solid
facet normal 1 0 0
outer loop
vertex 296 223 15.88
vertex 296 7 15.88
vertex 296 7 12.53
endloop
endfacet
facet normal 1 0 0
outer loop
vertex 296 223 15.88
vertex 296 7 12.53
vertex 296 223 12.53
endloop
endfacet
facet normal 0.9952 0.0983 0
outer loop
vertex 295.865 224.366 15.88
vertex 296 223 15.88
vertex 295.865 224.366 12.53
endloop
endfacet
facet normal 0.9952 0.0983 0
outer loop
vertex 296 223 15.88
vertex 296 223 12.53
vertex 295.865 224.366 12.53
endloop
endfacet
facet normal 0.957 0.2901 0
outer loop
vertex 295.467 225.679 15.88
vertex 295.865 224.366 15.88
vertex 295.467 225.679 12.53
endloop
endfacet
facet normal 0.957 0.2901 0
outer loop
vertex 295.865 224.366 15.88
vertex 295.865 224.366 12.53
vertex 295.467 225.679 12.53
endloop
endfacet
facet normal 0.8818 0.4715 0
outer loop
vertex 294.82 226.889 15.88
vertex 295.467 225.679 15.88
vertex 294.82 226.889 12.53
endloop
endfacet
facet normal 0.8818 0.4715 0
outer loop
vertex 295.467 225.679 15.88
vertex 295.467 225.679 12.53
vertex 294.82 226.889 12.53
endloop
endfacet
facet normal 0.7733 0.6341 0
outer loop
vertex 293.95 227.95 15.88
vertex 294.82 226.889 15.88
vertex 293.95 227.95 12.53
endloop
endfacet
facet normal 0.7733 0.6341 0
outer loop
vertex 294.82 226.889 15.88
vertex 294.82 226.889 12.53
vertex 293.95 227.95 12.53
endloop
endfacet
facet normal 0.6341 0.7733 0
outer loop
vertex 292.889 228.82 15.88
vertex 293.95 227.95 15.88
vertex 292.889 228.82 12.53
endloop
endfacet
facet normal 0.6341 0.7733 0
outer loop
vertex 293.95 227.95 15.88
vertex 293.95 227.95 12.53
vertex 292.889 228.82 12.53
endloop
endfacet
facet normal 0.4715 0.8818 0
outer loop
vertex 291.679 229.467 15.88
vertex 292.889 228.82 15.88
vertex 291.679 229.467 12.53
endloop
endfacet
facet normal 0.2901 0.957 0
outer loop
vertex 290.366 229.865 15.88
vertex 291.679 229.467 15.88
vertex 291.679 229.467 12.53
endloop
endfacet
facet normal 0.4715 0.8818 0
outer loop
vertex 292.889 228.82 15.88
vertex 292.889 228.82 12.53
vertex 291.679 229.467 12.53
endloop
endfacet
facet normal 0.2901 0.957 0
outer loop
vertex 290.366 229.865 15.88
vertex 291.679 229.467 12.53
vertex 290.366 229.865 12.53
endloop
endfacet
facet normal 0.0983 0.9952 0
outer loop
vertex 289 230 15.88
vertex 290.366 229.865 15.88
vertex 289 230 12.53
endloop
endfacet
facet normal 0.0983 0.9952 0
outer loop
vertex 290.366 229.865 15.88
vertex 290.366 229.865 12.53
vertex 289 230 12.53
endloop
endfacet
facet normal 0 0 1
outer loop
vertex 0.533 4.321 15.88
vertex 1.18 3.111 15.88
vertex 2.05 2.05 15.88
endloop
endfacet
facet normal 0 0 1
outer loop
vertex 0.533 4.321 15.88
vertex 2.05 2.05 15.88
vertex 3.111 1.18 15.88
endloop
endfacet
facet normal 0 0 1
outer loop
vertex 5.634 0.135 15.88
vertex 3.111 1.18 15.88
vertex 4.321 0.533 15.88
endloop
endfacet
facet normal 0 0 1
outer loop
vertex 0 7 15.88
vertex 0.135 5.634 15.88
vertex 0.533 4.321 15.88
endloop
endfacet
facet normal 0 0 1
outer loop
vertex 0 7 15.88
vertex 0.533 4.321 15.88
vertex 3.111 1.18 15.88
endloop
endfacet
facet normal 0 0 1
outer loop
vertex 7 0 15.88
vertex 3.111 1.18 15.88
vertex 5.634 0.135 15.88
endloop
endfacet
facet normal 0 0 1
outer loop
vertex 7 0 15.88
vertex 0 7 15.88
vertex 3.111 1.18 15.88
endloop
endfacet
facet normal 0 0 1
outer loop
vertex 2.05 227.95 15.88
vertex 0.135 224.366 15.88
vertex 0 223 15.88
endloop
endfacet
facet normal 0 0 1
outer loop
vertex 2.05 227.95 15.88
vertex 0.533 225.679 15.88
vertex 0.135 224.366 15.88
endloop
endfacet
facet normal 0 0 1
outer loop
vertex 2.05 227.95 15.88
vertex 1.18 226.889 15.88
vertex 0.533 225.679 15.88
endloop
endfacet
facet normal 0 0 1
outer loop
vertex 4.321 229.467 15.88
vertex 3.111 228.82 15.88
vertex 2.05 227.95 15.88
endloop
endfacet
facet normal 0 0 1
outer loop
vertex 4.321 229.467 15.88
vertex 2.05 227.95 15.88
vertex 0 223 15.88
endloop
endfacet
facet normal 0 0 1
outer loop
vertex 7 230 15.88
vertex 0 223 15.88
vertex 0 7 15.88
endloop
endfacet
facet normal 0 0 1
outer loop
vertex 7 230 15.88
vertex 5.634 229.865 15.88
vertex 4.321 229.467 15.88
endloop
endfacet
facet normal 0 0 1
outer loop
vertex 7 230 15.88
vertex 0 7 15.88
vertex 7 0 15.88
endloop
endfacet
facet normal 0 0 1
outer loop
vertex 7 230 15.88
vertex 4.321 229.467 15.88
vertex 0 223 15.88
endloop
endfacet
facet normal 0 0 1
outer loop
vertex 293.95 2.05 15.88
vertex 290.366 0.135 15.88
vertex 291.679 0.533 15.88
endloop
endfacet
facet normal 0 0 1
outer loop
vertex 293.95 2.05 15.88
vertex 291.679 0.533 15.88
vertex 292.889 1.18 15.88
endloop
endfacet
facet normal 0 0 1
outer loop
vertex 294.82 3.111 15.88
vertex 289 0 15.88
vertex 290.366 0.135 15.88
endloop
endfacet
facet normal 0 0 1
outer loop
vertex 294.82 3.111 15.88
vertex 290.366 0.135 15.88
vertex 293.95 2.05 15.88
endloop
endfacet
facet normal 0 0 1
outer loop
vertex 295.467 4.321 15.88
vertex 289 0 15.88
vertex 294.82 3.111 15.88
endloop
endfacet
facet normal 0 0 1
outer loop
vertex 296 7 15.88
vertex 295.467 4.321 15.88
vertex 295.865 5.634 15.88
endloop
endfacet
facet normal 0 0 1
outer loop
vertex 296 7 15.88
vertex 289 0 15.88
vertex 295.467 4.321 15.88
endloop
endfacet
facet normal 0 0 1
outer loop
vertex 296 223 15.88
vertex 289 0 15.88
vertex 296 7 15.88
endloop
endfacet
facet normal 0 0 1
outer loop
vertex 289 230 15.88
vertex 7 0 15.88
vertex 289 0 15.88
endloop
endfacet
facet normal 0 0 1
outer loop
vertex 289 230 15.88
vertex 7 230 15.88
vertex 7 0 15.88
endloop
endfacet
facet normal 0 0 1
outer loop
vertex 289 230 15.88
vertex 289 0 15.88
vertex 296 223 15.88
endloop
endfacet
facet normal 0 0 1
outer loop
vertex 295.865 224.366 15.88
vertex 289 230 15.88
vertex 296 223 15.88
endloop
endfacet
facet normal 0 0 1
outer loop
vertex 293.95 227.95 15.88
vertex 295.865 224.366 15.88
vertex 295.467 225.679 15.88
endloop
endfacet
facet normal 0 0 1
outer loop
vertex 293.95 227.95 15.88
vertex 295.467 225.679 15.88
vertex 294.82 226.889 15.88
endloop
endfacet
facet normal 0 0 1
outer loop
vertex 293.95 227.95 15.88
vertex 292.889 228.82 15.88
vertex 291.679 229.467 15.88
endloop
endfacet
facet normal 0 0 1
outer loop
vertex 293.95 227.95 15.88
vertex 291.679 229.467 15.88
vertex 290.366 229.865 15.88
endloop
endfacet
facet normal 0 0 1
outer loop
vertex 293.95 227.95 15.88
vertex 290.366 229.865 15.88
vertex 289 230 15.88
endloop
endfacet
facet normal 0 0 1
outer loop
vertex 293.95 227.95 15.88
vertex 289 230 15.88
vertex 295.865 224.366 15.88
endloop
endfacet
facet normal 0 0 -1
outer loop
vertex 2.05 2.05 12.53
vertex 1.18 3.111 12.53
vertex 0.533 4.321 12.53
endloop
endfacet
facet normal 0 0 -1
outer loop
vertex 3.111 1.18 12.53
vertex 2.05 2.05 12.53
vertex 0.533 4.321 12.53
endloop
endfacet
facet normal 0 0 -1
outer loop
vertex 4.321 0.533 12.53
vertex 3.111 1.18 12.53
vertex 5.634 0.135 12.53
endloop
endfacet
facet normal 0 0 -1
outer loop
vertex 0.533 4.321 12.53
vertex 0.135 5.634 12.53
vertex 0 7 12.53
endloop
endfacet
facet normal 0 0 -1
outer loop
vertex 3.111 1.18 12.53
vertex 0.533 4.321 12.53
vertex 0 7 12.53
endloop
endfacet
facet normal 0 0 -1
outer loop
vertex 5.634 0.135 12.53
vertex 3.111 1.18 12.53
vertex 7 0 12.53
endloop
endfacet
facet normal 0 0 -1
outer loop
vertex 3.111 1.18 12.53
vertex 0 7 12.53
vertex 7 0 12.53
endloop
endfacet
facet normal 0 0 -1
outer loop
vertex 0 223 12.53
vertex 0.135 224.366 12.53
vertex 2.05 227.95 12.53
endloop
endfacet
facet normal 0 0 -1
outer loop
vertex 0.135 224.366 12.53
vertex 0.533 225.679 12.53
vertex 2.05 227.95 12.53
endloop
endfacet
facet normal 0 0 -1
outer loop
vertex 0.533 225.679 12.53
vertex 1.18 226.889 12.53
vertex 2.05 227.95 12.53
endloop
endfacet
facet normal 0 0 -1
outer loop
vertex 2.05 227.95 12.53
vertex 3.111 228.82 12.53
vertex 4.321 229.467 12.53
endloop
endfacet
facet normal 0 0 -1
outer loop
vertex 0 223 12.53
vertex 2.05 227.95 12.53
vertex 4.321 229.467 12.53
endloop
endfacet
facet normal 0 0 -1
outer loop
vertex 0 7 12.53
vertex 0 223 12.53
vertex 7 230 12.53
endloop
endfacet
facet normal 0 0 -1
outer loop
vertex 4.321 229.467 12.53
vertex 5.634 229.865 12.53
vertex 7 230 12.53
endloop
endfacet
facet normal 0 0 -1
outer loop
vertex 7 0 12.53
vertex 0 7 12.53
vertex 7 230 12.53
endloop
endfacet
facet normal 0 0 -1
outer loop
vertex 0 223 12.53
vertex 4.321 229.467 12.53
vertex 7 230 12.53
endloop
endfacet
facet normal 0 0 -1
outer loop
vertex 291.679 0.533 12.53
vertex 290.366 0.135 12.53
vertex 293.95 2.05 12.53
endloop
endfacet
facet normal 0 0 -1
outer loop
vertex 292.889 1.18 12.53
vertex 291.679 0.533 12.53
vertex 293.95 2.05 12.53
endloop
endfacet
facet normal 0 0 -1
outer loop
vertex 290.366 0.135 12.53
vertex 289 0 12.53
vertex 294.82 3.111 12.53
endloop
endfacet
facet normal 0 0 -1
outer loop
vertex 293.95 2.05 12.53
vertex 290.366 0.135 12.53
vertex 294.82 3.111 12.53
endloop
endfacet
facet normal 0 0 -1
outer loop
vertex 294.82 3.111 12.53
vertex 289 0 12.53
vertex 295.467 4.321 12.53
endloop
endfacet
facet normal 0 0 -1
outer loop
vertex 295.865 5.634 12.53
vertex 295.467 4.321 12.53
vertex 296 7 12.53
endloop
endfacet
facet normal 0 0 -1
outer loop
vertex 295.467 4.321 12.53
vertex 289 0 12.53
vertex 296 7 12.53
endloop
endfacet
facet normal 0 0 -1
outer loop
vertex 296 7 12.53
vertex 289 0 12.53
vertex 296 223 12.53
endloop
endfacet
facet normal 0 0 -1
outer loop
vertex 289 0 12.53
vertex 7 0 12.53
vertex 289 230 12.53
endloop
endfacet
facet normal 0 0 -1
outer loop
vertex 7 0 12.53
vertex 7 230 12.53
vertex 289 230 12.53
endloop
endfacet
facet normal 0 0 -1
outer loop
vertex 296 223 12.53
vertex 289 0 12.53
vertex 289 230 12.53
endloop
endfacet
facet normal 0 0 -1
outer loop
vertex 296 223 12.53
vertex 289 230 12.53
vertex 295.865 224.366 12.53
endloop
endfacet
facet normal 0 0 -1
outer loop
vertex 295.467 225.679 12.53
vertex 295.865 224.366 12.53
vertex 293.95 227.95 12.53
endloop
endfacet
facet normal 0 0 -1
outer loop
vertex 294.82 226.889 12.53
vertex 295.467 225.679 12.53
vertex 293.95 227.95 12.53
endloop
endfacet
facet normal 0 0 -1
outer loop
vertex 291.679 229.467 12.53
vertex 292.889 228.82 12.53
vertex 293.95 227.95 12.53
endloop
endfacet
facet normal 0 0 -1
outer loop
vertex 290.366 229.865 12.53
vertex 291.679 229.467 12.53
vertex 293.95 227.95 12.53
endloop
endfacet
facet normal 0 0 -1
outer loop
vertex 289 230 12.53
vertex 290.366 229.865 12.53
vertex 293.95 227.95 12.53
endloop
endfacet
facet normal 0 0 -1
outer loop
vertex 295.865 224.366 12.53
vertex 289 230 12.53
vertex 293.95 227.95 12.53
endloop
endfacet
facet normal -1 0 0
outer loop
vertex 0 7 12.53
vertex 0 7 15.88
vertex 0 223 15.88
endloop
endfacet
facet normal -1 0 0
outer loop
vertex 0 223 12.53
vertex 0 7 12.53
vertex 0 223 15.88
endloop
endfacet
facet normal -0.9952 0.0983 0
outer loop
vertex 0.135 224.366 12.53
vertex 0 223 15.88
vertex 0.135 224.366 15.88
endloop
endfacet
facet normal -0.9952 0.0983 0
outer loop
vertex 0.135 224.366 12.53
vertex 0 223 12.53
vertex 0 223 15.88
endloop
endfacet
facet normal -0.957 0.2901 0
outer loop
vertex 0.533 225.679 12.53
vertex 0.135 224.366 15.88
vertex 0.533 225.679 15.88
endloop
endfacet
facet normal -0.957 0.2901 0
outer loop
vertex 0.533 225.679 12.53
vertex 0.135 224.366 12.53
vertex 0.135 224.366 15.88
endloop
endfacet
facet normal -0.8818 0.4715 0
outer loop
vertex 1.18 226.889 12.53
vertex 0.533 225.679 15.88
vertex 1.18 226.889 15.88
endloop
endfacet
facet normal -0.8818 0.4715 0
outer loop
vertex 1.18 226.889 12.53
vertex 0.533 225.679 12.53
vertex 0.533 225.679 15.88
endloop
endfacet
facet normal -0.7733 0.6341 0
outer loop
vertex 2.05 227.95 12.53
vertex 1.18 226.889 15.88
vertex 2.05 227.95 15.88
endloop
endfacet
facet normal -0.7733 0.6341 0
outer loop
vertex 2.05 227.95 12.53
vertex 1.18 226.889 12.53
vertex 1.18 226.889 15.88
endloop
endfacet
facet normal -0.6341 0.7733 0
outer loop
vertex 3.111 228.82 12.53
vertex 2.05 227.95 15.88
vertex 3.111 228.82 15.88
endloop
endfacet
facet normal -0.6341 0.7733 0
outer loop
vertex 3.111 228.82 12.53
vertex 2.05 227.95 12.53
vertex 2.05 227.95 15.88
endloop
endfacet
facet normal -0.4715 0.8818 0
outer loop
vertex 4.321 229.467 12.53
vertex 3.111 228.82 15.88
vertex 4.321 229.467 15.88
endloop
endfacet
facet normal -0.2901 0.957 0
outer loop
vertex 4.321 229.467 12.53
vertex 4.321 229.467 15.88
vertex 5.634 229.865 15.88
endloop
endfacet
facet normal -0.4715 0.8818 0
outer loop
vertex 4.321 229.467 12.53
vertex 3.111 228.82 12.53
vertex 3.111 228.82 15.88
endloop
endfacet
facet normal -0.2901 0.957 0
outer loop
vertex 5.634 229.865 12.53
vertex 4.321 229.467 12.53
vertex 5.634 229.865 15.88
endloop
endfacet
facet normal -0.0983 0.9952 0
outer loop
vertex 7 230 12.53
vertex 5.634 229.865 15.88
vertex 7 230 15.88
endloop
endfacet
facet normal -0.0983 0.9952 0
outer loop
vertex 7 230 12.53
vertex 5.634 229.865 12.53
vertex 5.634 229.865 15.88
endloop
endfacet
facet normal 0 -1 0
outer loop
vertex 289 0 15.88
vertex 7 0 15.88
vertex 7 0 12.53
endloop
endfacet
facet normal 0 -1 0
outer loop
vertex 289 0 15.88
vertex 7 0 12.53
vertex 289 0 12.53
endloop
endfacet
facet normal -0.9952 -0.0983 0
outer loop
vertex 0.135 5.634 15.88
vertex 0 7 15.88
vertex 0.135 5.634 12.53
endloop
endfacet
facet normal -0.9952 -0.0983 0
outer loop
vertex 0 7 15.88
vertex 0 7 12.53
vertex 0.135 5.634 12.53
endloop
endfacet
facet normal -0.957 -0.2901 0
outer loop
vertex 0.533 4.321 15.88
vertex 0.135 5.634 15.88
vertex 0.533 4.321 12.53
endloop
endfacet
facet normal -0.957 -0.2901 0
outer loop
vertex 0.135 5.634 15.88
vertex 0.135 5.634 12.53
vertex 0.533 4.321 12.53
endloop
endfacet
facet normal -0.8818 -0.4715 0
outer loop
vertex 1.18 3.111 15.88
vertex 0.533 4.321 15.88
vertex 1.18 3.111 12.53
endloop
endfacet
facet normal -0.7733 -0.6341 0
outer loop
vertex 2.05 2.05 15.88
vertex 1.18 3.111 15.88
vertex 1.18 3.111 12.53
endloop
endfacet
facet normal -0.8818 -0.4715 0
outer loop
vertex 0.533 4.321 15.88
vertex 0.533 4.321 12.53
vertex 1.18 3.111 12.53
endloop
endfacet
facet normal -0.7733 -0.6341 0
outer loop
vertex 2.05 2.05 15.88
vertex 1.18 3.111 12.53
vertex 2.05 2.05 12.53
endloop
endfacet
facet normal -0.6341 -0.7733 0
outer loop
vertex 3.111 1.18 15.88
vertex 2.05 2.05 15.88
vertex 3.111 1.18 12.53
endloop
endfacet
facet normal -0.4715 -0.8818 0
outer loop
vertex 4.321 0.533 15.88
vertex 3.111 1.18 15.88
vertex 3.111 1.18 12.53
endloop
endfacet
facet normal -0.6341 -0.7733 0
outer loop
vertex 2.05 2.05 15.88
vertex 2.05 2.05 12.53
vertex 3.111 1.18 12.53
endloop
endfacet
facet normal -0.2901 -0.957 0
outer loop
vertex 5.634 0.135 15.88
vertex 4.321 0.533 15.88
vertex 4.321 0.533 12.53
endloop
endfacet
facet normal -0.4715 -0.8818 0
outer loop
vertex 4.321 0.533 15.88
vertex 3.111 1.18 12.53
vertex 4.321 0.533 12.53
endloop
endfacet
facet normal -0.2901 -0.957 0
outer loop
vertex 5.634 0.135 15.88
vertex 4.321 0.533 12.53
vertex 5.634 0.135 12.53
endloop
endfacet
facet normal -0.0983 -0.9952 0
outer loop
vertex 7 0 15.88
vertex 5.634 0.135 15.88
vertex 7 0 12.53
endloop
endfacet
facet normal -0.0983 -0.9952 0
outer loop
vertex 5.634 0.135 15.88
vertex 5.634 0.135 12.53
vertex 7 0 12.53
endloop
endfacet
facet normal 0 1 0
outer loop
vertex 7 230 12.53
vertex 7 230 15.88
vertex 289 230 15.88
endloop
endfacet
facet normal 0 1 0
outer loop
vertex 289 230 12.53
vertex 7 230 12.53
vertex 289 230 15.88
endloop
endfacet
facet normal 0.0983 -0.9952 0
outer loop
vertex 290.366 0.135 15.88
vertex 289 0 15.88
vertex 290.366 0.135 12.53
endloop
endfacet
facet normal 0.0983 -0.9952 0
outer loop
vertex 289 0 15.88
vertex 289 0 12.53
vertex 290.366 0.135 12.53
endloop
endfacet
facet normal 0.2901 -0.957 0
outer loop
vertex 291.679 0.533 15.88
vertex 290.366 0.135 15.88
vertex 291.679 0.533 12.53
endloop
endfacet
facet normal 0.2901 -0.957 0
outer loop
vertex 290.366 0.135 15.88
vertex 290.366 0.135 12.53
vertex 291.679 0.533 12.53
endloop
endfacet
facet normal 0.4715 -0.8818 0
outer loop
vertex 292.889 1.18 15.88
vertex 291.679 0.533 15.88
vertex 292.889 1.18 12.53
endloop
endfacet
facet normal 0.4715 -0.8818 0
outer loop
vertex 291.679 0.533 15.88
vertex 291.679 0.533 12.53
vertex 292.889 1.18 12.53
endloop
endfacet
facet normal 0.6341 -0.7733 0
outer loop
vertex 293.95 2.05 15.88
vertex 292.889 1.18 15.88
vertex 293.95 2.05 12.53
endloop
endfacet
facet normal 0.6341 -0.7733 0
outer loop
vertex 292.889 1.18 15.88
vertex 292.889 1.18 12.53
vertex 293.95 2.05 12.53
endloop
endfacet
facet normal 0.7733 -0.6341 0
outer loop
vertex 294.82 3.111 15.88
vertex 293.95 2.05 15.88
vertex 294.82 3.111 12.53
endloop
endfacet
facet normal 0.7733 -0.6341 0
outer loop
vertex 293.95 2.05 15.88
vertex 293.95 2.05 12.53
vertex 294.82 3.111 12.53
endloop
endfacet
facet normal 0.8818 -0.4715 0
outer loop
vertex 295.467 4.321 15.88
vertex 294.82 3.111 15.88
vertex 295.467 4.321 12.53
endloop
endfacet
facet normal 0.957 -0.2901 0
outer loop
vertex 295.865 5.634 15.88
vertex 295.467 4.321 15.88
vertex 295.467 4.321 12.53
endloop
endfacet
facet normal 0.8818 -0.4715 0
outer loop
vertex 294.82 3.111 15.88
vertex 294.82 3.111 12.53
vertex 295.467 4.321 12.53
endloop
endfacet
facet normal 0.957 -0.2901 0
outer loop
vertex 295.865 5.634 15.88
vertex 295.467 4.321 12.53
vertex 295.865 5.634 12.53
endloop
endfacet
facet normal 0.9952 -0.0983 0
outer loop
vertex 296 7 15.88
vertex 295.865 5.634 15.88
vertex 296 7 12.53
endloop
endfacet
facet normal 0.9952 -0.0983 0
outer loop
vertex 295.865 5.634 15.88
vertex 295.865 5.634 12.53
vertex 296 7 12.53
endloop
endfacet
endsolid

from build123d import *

# Parameters (mm, degrees)
SKETCH008_W  = 296
SKETCH008_H  = 230
PAD001_DEPTH = 3.35
FILLET001_R  = 7


with BuildPart() as part:
    # Sketch008 → Pad001 (new body)
    with BuildSketch(Plane.XY.offset(15.88)):
        with Locations((148, 115)):
            Rectangle(SKETCH008_W, SKETCH008_H)
    extrude(amount=-PAD001_DEPTH)

    # Fillet001
    fillet001_edges = [part.edges().sort_by_distance(p)[0] for p in [
        (296, 230, 14.205),
        (0, 230, 14.205),
        (0, 0, 14.205),
        (296, 0, 14.205),
    ]]
    fillet(fillet001_edges, radius=FILLET001_R)


solid = part.part
